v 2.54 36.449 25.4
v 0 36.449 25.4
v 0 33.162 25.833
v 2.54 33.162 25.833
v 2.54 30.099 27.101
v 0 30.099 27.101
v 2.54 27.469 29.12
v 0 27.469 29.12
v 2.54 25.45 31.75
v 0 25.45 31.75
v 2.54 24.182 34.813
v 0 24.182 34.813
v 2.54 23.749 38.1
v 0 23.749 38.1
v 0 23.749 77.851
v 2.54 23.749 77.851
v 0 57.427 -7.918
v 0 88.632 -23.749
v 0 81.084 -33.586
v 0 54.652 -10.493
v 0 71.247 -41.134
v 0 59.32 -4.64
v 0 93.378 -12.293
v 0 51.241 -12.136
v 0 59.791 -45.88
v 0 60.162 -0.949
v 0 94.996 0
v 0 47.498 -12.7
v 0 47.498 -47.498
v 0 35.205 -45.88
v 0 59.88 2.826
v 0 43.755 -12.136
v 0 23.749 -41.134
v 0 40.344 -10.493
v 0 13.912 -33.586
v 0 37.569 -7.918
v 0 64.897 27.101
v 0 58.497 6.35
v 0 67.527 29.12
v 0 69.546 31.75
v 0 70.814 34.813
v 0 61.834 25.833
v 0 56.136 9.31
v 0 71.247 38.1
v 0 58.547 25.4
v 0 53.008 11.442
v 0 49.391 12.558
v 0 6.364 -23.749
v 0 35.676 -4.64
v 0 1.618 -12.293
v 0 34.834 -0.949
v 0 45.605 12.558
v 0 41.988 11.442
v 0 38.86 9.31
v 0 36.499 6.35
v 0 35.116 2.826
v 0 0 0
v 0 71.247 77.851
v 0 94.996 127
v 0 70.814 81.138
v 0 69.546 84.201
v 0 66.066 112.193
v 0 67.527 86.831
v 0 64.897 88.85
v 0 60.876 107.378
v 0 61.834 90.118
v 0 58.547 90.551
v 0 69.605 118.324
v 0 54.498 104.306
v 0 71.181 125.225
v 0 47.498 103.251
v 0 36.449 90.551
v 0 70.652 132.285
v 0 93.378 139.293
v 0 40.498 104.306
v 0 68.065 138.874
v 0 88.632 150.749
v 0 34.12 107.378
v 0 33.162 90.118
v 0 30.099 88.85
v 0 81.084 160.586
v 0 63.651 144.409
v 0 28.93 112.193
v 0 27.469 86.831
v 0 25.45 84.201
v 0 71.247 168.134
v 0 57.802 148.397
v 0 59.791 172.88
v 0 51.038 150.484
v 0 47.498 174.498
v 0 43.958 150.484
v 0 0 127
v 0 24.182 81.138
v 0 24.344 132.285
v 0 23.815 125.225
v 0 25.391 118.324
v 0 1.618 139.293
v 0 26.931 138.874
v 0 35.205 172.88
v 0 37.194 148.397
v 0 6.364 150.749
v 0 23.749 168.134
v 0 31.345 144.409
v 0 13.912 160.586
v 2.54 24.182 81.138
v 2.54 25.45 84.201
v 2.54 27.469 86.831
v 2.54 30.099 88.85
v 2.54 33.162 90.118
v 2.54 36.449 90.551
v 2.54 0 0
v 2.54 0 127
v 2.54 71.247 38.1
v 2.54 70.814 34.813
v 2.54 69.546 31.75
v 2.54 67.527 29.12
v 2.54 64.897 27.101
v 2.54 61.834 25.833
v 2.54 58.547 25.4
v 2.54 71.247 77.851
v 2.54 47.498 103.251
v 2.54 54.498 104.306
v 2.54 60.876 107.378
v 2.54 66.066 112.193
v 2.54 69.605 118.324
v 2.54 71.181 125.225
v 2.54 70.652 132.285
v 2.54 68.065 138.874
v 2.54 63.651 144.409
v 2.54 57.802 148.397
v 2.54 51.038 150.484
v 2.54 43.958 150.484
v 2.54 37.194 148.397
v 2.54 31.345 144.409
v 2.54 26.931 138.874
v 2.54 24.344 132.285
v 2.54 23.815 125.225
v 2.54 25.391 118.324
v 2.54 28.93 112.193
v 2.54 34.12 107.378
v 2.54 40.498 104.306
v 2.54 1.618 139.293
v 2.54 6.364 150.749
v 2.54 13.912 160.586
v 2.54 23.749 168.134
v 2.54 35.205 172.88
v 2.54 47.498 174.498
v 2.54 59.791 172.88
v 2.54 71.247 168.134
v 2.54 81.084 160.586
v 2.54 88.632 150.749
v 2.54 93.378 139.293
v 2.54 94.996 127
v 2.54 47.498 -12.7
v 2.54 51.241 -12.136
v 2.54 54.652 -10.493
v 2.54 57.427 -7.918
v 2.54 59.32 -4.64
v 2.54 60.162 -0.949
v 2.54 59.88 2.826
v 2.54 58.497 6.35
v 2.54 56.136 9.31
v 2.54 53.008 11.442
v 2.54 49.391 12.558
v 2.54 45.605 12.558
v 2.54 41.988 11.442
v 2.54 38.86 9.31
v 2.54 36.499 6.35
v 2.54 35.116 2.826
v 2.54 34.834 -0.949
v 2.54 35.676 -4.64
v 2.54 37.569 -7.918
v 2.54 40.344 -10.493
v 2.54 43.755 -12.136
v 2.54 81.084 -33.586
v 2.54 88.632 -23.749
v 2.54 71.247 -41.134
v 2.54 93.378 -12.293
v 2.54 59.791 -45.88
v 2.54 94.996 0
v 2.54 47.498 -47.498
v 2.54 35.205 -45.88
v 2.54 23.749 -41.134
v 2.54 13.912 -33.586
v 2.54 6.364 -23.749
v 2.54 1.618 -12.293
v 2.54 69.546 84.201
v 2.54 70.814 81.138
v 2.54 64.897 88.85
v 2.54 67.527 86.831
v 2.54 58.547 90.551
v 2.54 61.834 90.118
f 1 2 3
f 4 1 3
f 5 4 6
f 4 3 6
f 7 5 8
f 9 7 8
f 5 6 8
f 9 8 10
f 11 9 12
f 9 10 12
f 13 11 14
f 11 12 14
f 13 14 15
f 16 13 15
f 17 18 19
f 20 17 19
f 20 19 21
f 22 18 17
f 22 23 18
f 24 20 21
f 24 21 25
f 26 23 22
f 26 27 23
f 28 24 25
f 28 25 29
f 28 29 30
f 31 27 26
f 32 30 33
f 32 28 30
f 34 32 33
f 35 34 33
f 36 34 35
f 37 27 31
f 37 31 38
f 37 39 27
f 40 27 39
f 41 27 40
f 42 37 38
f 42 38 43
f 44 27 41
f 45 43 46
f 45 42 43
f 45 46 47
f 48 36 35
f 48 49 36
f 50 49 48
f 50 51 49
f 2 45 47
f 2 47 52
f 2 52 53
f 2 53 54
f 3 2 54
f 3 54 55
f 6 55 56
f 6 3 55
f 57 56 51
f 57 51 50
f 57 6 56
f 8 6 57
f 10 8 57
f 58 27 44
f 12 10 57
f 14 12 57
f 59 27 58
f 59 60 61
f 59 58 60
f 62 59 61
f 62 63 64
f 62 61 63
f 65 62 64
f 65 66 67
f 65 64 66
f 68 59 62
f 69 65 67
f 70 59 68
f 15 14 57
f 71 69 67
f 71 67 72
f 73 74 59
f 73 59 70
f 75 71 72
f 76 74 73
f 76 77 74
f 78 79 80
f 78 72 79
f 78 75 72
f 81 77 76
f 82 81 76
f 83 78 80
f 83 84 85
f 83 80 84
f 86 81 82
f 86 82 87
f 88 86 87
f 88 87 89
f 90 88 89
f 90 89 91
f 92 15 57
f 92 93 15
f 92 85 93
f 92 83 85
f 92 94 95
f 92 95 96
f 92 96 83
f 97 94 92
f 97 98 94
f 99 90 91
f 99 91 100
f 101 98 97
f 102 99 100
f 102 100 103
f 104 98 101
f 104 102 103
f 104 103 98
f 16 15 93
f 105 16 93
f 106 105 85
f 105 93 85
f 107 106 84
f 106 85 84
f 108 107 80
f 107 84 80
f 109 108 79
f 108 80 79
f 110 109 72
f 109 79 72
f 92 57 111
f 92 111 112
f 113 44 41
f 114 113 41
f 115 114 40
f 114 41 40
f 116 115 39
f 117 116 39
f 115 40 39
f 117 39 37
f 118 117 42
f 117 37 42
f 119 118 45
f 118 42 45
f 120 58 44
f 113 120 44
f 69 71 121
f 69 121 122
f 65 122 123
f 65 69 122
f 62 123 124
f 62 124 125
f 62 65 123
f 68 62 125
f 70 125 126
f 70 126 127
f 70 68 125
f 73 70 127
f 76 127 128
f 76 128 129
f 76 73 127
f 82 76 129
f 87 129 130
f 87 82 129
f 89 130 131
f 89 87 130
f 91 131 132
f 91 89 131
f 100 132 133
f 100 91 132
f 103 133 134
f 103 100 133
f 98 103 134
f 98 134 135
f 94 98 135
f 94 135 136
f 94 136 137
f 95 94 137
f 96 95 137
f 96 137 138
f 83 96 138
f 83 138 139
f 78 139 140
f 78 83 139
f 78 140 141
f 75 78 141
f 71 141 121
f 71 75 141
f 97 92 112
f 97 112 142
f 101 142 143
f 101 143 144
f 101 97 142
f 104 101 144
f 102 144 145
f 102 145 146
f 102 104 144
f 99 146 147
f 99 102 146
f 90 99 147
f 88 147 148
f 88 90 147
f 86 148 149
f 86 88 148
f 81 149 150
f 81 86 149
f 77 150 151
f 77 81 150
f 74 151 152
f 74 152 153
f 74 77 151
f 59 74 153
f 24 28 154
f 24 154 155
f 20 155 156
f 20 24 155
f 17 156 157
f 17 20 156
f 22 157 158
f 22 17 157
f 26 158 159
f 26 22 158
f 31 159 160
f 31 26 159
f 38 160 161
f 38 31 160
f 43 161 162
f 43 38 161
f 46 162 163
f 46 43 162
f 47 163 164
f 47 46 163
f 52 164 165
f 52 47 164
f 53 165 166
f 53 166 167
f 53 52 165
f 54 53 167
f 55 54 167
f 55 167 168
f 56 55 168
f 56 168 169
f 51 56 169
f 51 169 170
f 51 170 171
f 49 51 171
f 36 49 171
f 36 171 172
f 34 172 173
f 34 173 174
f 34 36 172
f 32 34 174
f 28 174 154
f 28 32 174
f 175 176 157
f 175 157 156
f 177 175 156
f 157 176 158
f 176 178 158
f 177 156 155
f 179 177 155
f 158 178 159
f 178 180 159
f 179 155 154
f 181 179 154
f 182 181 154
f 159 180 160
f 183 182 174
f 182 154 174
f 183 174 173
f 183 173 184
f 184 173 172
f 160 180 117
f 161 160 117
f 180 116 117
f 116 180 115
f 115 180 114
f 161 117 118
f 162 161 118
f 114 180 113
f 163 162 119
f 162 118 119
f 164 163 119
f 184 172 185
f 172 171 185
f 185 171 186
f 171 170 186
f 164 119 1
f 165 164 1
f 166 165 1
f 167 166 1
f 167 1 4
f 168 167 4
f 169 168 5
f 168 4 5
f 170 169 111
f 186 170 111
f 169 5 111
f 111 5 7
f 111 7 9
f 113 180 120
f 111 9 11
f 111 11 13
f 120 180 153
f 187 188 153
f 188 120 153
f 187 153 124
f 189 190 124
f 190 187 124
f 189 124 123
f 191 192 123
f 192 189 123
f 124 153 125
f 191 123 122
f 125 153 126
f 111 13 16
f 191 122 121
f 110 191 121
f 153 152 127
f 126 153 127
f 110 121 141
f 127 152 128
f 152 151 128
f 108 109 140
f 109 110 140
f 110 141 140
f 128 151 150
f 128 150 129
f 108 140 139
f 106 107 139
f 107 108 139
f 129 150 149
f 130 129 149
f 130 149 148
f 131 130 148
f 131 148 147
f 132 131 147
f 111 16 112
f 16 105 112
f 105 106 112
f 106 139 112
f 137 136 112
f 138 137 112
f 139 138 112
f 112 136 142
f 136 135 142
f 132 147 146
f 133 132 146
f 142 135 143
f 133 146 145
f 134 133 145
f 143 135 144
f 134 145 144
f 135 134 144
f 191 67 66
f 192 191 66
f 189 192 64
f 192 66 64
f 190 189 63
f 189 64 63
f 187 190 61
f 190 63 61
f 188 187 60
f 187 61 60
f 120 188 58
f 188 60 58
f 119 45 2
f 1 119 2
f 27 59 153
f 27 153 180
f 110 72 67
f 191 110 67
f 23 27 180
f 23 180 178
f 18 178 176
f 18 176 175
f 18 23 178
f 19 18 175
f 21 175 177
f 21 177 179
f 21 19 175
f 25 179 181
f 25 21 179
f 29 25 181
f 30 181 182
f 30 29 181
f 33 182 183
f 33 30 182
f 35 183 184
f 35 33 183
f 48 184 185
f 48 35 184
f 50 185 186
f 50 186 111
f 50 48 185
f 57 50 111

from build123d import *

# Parameters (mm, degrees)
SKETCH1_R           = 12.7
SKETCH1_R_2         = 23.749
BOSS_EXTRUDE2_DEPTH = 2.54


with BuildPart() as part:
    # Sketch1 → Boss-Extrude2 (new body)
    with BuildSketch(Plane.YZ):
        with BuildLine():
            Line((0, 0), (0, 127))
            ThreePointArc((0, 127), (47.498, 174.498), (94.996, 127))
            Line((94.996, 127), (94.996, 0))
            ThreePointArc((94.996, 0), (47.498, -47.498), (0, 0))
        make_face()
        with Locations(Location((47.498, 0, 0), (0, 0, 270))):
            Circle(SKETCH1_R, mode=Mode.SUBTRACT)
        with Locations(Location((47.498, 127, 0), (0, 0, 270))):
            Circle(SKETCH1_R_2, mode=Mode.SUBTRACT)
        with BuildLine():
            Line((36.449, 90.551), (58.547, 90.551))
            ThreePointArc((58.547, 90.551), (67.527256121, 86.831256121), (71.247, 77.851))
            Line((71.247, 77.851), (71.247, 38.1))
            ThreePointArc((71.247, 38.1), (67.527256121, 29.119743879), (58.547, 25.4))
            Line((58.547, 25.4), (36.449, 25.4))
            ThreePointArc((36.449, 25.4), (27.468743879, 29.119743879), (23.749, 38.1))
            Line((23.749, 38.1), (23.749, 77.851))
            ThreePointArc((23.749, 77.851), (27.468743879, 86.831256121), (36.449, 90.551))
        make_face(mode=Mode.SUBTRACT)
    extrude(amount=BOSS_EXTRUDE2_DEPTH)


solid = part.part
